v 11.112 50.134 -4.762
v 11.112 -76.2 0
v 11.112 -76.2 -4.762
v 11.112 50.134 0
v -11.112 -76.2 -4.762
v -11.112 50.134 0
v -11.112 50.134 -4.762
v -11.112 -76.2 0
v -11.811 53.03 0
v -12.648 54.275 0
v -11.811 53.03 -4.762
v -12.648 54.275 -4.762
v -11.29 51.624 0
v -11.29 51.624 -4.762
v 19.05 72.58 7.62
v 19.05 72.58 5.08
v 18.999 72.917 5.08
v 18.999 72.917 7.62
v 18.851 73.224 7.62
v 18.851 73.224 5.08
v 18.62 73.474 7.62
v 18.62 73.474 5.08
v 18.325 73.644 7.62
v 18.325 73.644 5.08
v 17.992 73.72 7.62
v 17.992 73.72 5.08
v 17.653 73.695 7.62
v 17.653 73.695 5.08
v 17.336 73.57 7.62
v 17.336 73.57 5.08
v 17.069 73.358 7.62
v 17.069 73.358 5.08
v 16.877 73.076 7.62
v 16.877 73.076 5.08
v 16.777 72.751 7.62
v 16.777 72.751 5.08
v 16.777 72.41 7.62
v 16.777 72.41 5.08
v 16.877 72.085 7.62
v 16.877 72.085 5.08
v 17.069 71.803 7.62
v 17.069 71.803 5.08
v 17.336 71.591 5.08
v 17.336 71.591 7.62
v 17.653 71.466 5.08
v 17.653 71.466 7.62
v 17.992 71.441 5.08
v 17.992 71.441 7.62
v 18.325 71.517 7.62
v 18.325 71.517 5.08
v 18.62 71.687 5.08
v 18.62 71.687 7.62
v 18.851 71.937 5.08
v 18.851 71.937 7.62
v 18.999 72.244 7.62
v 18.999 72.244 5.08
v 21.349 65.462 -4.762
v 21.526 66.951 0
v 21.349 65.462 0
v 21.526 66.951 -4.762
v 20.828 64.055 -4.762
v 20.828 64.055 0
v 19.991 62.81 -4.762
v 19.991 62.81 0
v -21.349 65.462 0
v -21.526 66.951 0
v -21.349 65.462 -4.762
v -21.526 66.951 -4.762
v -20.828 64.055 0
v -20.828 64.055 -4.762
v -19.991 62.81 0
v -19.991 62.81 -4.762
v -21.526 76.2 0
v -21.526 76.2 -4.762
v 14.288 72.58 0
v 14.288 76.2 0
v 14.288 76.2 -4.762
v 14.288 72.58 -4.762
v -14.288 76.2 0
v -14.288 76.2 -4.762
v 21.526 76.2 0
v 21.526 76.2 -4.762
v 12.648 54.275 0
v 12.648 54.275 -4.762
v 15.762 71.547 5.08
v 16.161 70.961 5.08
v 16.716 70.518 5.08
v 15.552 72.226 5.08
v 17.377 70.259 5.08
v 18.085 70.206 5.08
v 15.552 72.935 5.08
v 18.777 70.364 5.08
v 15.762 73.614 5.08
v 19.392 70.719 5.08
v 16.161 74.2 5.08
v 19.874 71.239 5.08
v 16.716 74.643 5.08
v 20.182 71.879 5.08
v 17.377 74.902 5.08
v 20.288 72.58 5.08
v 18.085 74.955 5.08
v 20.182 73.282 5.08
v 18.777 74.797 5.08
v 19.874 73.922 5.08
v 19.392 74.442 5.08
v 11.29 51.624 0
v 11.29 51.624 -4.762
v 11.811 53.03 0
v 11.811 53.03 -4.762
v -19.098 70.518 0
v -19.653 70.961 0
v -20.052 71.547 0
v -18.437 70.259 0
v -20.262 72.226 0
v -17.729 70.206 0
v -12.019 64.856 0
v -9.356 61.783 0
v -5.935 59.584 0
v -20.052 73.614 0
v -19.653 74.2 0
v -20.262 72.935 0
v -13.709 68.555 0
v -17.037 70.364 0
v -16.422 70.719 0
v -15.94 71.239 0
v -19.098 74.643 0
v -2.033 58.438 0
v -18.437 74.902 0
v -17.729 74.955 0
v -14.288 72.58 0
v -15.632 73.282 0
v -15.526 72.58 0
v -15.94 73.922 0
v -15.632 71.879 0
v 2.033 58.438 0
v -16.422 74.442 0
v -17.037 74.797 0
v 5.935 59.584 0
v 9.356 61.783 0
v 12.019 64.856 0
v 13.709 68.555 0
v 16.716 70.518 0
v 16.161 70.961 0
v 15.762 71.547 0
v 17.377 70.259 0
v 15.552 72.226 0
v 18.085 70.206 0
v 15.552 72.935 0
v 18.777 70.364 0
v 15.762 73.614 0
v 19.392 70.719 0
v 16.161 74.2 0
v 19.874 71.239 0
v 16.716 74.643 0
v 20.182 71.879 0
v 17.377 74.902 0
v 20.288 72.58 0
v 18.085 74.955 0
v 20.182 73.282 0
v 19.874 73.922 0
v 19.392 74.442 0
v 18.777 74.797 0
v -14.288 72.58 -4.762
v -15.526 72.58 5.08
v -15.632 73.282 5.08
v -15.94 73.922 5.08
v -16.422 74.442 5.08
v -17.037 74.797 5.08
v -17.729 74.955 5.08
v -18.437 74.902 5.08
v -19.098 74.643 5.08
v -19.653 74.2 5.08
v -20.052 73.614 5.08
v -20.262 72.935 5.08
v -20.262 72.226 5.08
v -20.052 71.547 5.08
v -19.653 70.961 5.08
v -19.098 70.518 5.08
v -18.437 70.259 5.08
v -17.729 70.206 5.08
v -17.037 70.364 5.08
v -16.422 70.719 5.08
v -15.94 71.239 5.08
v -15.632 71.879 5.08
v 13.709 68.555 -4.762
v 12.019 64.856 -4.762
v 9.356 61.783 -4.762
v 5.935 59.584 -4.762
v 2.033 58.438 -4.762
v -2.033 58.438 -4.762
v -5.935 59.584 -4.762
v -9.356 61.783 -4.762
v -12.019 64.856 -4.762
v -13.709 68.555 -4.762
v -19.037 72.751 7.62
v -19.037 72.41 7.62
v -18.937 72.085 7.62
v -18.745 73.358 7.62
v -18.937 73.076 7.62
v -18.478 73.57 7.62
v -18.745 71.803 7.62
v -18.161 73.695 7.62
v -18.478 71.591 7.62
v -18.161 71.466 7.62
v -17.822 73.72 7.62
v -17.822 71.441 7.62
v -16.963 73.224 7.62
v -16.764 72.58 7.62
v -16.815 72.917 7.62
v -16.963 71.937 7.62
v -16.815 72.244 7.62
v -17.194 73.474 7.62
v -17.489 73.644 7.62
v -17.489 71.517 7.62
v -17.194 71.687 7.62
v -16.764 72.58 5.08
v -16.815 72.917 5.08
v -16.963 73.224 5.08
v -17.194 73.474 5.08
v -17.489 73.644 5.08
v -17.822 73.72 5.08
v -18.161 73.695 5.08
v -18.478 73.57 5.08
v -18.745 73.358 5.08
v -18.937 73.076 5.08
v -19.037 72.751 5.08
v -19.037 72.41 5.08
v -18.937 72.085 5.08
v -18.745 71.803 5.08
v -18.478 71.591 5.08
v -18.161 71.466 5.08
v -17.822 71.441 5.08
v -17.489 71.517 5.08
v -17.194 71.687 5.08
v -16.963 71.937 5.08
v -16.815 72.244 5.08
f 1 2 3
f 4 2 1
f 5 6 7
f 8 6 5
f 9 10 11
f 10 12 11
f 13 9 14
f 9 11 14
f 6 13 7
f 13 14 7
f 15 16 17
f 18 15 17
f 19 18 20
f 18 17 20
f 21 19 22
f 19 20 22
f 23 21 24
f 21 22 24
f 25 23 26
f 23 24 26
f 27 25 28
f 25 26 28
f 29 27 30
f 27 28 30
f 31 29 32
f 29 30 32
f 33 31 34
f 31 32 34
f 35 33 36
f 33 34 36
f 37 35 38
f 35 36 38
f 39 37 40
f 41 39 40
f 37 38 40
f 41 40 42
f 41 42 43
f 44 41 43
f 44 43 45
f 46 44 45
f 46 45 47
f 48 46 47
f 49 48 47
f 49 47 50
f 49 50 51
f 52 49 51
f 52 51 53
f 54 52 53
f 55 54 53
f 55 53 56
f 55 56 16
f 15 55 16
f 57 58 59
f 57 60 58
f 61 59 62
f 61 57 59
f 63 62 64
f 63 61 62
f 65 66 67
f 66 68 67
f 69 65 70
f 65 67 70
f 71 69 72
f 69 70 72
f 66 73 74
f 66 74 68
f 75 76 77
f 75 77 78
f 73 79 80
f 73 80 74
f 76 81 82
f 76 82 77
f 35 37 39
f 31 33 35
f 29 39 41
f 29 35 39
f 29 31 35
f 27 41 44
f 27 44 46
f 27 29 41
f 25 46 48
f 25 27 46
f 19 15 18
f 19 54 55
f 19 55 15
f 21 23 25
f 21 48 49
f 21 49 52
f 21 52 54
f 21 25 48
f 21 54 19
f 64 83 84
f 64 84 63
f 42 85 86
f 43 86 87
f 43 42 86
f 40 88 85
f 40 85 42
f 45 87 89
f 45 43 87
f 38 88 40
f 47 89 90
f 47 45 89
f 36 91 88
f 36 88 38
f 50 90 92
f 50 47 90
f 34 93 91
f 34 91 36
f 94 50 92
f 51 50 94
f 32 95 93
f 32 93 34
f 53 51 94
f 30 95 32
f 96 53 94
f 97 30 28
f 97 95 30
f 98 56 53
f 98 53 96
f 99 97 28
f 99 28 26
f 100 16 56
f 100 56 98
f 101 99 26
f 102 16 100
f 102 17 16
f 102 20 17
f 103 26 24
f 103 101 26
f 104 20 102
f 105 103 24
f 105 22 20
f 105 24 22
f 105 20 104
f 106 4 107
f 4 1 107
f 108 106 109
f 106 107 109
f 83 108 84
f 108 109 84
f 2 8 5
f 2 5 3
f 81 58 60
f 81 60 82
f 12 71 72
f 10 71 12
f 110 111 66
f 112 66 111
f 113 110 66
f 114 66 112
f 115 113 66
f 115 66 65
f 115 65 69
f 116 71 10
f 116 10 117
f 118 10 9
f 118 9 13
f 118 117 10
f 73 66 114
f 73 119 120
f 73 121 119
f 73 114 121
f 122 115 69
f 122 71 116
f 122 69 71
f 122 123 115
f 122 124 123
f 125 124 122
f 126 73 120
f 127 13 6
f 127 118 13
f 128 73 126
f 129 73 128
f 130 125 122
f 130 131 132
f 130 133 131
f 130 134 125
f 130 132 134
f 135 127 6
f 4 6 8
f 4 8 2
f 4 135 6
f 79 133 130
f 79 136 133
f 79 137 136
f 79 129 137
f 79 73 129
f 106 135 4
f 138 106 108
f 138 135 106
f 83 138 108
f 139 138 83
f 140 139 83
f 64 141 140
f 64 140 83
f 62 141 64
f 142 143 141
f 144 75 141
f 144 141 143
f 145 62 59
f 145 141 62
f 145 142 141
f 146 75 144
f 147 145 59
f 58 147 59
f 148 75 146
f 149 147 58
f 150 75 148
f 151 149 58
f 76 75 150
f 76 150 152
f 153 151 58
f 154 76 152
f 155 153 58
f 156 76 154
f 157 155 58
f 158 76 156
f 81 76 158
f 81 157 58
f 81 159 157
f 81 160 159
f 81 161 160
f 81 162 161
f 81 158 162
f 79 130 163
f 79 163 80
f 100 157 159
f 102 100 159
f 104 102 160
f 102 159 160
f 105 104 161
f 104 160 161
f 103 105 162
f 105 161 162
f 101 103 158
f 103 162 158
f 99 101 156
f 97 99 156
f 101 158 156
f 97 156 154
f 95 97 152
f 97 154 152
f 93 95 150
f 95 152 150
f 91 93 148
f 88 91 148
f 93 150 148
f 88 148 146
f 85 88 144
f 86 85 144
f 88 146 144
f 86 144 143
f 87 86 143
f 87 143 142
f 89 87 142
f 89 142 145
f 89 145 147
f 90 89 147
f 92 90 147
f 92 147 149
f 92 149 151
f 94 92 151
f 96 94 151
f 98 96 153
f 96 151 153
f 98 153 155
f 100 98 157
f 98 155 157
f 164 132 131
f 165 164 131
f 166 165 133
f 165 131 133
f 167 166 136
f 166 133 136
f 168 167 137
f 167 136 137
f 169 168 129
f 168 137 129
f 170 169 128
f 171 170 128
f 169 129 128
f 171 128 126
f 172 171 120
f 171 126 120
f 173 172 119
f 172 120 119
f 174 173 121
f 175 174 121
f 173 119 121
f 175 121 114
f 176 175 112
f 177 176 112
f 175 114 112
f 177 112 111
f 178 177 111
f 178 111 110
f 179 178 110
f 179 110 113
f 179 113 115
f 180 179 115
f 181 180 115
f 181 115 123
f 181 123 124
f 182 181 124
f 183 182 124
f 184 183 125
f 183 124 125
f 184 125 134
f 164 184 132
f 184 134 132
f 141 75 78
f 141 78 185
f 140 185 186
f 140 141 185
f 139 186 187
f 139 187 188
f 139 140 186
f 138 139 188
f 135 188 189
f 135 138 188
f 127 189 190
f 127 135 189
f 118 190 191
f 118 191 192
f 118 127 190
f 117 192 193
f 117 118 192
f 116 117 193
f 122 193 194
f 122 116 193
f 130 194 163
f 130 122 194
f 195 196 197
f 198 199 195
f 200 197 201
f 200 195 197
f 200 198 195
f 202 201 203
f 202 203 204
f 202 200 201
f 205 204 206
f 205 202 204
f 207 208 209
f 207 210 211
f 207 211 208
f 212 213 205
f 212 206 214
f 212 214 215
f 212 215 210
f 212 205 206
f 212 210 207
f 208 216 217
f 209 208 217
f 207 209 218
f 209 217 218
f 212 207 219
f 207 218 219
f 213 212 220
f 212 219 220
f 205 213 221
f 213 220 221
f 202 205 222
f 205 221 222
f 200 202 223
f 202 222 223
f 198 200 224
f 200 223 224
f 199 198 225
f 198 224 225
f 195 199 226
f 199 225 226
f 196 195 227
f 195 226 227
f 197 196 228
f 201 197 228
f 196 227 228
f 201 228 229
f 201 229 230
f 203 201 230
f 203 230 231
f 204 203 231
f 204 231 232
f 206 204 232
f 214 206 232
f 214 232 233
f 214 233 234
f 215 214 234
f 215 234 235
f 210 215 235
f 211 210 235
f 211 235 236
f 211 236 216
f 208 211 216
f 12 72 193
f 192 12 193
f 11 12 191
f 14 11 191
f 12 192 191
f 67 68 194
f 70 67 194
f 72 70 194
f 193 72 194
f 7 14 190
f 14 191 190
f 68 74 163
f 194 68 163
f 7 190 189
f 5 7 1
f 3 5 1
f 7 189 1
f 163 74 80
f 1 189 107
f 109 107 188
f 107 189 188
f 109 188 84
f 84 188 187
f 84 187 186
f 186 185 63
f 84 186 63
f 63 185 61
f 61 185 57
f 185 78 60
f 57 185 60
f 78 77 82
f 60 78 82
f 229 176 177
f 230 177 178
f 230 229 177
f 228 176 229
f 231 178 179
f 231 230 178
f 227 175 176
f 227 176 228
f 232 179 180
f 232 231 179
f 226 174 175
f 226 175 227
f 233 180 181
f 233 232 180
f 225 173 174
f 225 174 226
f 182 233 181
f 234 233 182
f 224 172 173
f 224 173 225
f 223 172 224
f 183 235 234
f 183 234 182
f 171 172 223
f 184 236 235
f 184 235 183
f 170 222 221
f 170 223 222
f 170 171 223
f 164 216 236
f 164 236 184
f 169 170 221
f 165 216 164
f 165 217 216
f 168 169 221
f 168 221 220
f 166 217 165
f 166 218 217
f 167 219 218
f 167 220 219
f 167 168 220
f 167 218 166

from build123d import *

# Parameters (mm, degrees)
F0_R     = 2.38125
F0_R_2   = 1.143
F1_DEPTH = 4.7625
F2_R     = 6.35
F3_DEPTH = 7.62
F4_DEPTH = 5.08


with BuildPart() as f1:
    # F0 (on Top) → F1 (new body)
    with BuildSketch(Plane.XY):
        with BuildLine():
            Line((21.5265, 64.595826), (21.5265, 76.2))
            Line((21.5265, 76.2), (14.2875, 76.2))
            Line((14.2875, 76.2), (14.2875, 72.5805))
            ThreePointArc((14.2875, 72.5805), (0, 58.293), (-14.2875, 72.5805))
            Line((-14.2875, 72.5805), (-14.2875, 76.2))
            Line((-14.2875, 76.2), (-21.5265, 76.2))
            Line((-21.5265, 76.2), (-21.5265, 64.595826))
            Line((-21.5265, 64.595826), (-11.1125, 52.489269))
            Line((-11.1125, 52.489269), (-11.1125, -76.2))
            Line((-11.1125, -76.2), (11.1125, -76.2))
            Line((11.1125, -76.2), (11.1125, 52.489269))
            Line((11.1125, 52.489269), (21.5265, 64.595826))
        make_face()
        with Locations((-17.907, 72.5805)):
            Circle(F0_R, mode=Mode.SUBTRACT)
        with Locations((17.907, 72.5805)):
            Circle(F0_R, mode=Mode.SUBTRACT)
        with Locations((-17.907, 72.5805)):
            Circle(F0_R)
        with Locations((-17.907, 72.5805)):
            Circle(F0_R_2, mode=Mode.SUBTRACT)
        with Locations((17.907, 72.5805)):
            Circle(F0_R)
        with Locations((17.907, 72.5805)):
            Circle(F0_R_2, mode=Mode.SUBTRACT)
        with Locations((-17.907, 72.5805)):
            Circle(F0_R_2)
        with Locations((17.907, 72.5805)):
            Circle(F0_R_2)
    extrude(amount=-F1_DEPTH)

    # F2
    f2_edges = [f1.edges().sort_by_distance(p)[0] for p in [
        (21.5265, 64.595826, -2.38125),
        (11.1125, 52.489269, -2.38125),
        (-21.5265, 64.595826, -2.38125),
        (-11.1125, 52.489269, -2.38125),
    ]]
    fillet(f2_edges, radius=F2_R)

    # F0 (on Top) → F3 (join)
    with BuildSketch(Plane.XY):
        with Locations((17.907, 72.5805)):
            Circle(F0_R_2)
        with Locations((-17.907, 72.5805)):
            Circle(F0_R_2)
    extrude(amount=F3_DEPTH)

    # F0 (on Top) → F4 (join)
    with BuildSketch(Plane.XY):
        with Locations((-17.907, 72.5805)):
            Circle(F0_R)
        with Locations((-17.907, 72.5805)):
            Circle(F0_R_2, mode=Mode.SUBTRACT)
        with Locations((17.907, 72.5805)):
            Circle(F0_R)
        with Locations((17.907, 72.5805)):
            Circle(F0_R_2, mode=Mode.SUBTRACT)
    extrude(amount=F4_DEPTH)


solid = f1.part
